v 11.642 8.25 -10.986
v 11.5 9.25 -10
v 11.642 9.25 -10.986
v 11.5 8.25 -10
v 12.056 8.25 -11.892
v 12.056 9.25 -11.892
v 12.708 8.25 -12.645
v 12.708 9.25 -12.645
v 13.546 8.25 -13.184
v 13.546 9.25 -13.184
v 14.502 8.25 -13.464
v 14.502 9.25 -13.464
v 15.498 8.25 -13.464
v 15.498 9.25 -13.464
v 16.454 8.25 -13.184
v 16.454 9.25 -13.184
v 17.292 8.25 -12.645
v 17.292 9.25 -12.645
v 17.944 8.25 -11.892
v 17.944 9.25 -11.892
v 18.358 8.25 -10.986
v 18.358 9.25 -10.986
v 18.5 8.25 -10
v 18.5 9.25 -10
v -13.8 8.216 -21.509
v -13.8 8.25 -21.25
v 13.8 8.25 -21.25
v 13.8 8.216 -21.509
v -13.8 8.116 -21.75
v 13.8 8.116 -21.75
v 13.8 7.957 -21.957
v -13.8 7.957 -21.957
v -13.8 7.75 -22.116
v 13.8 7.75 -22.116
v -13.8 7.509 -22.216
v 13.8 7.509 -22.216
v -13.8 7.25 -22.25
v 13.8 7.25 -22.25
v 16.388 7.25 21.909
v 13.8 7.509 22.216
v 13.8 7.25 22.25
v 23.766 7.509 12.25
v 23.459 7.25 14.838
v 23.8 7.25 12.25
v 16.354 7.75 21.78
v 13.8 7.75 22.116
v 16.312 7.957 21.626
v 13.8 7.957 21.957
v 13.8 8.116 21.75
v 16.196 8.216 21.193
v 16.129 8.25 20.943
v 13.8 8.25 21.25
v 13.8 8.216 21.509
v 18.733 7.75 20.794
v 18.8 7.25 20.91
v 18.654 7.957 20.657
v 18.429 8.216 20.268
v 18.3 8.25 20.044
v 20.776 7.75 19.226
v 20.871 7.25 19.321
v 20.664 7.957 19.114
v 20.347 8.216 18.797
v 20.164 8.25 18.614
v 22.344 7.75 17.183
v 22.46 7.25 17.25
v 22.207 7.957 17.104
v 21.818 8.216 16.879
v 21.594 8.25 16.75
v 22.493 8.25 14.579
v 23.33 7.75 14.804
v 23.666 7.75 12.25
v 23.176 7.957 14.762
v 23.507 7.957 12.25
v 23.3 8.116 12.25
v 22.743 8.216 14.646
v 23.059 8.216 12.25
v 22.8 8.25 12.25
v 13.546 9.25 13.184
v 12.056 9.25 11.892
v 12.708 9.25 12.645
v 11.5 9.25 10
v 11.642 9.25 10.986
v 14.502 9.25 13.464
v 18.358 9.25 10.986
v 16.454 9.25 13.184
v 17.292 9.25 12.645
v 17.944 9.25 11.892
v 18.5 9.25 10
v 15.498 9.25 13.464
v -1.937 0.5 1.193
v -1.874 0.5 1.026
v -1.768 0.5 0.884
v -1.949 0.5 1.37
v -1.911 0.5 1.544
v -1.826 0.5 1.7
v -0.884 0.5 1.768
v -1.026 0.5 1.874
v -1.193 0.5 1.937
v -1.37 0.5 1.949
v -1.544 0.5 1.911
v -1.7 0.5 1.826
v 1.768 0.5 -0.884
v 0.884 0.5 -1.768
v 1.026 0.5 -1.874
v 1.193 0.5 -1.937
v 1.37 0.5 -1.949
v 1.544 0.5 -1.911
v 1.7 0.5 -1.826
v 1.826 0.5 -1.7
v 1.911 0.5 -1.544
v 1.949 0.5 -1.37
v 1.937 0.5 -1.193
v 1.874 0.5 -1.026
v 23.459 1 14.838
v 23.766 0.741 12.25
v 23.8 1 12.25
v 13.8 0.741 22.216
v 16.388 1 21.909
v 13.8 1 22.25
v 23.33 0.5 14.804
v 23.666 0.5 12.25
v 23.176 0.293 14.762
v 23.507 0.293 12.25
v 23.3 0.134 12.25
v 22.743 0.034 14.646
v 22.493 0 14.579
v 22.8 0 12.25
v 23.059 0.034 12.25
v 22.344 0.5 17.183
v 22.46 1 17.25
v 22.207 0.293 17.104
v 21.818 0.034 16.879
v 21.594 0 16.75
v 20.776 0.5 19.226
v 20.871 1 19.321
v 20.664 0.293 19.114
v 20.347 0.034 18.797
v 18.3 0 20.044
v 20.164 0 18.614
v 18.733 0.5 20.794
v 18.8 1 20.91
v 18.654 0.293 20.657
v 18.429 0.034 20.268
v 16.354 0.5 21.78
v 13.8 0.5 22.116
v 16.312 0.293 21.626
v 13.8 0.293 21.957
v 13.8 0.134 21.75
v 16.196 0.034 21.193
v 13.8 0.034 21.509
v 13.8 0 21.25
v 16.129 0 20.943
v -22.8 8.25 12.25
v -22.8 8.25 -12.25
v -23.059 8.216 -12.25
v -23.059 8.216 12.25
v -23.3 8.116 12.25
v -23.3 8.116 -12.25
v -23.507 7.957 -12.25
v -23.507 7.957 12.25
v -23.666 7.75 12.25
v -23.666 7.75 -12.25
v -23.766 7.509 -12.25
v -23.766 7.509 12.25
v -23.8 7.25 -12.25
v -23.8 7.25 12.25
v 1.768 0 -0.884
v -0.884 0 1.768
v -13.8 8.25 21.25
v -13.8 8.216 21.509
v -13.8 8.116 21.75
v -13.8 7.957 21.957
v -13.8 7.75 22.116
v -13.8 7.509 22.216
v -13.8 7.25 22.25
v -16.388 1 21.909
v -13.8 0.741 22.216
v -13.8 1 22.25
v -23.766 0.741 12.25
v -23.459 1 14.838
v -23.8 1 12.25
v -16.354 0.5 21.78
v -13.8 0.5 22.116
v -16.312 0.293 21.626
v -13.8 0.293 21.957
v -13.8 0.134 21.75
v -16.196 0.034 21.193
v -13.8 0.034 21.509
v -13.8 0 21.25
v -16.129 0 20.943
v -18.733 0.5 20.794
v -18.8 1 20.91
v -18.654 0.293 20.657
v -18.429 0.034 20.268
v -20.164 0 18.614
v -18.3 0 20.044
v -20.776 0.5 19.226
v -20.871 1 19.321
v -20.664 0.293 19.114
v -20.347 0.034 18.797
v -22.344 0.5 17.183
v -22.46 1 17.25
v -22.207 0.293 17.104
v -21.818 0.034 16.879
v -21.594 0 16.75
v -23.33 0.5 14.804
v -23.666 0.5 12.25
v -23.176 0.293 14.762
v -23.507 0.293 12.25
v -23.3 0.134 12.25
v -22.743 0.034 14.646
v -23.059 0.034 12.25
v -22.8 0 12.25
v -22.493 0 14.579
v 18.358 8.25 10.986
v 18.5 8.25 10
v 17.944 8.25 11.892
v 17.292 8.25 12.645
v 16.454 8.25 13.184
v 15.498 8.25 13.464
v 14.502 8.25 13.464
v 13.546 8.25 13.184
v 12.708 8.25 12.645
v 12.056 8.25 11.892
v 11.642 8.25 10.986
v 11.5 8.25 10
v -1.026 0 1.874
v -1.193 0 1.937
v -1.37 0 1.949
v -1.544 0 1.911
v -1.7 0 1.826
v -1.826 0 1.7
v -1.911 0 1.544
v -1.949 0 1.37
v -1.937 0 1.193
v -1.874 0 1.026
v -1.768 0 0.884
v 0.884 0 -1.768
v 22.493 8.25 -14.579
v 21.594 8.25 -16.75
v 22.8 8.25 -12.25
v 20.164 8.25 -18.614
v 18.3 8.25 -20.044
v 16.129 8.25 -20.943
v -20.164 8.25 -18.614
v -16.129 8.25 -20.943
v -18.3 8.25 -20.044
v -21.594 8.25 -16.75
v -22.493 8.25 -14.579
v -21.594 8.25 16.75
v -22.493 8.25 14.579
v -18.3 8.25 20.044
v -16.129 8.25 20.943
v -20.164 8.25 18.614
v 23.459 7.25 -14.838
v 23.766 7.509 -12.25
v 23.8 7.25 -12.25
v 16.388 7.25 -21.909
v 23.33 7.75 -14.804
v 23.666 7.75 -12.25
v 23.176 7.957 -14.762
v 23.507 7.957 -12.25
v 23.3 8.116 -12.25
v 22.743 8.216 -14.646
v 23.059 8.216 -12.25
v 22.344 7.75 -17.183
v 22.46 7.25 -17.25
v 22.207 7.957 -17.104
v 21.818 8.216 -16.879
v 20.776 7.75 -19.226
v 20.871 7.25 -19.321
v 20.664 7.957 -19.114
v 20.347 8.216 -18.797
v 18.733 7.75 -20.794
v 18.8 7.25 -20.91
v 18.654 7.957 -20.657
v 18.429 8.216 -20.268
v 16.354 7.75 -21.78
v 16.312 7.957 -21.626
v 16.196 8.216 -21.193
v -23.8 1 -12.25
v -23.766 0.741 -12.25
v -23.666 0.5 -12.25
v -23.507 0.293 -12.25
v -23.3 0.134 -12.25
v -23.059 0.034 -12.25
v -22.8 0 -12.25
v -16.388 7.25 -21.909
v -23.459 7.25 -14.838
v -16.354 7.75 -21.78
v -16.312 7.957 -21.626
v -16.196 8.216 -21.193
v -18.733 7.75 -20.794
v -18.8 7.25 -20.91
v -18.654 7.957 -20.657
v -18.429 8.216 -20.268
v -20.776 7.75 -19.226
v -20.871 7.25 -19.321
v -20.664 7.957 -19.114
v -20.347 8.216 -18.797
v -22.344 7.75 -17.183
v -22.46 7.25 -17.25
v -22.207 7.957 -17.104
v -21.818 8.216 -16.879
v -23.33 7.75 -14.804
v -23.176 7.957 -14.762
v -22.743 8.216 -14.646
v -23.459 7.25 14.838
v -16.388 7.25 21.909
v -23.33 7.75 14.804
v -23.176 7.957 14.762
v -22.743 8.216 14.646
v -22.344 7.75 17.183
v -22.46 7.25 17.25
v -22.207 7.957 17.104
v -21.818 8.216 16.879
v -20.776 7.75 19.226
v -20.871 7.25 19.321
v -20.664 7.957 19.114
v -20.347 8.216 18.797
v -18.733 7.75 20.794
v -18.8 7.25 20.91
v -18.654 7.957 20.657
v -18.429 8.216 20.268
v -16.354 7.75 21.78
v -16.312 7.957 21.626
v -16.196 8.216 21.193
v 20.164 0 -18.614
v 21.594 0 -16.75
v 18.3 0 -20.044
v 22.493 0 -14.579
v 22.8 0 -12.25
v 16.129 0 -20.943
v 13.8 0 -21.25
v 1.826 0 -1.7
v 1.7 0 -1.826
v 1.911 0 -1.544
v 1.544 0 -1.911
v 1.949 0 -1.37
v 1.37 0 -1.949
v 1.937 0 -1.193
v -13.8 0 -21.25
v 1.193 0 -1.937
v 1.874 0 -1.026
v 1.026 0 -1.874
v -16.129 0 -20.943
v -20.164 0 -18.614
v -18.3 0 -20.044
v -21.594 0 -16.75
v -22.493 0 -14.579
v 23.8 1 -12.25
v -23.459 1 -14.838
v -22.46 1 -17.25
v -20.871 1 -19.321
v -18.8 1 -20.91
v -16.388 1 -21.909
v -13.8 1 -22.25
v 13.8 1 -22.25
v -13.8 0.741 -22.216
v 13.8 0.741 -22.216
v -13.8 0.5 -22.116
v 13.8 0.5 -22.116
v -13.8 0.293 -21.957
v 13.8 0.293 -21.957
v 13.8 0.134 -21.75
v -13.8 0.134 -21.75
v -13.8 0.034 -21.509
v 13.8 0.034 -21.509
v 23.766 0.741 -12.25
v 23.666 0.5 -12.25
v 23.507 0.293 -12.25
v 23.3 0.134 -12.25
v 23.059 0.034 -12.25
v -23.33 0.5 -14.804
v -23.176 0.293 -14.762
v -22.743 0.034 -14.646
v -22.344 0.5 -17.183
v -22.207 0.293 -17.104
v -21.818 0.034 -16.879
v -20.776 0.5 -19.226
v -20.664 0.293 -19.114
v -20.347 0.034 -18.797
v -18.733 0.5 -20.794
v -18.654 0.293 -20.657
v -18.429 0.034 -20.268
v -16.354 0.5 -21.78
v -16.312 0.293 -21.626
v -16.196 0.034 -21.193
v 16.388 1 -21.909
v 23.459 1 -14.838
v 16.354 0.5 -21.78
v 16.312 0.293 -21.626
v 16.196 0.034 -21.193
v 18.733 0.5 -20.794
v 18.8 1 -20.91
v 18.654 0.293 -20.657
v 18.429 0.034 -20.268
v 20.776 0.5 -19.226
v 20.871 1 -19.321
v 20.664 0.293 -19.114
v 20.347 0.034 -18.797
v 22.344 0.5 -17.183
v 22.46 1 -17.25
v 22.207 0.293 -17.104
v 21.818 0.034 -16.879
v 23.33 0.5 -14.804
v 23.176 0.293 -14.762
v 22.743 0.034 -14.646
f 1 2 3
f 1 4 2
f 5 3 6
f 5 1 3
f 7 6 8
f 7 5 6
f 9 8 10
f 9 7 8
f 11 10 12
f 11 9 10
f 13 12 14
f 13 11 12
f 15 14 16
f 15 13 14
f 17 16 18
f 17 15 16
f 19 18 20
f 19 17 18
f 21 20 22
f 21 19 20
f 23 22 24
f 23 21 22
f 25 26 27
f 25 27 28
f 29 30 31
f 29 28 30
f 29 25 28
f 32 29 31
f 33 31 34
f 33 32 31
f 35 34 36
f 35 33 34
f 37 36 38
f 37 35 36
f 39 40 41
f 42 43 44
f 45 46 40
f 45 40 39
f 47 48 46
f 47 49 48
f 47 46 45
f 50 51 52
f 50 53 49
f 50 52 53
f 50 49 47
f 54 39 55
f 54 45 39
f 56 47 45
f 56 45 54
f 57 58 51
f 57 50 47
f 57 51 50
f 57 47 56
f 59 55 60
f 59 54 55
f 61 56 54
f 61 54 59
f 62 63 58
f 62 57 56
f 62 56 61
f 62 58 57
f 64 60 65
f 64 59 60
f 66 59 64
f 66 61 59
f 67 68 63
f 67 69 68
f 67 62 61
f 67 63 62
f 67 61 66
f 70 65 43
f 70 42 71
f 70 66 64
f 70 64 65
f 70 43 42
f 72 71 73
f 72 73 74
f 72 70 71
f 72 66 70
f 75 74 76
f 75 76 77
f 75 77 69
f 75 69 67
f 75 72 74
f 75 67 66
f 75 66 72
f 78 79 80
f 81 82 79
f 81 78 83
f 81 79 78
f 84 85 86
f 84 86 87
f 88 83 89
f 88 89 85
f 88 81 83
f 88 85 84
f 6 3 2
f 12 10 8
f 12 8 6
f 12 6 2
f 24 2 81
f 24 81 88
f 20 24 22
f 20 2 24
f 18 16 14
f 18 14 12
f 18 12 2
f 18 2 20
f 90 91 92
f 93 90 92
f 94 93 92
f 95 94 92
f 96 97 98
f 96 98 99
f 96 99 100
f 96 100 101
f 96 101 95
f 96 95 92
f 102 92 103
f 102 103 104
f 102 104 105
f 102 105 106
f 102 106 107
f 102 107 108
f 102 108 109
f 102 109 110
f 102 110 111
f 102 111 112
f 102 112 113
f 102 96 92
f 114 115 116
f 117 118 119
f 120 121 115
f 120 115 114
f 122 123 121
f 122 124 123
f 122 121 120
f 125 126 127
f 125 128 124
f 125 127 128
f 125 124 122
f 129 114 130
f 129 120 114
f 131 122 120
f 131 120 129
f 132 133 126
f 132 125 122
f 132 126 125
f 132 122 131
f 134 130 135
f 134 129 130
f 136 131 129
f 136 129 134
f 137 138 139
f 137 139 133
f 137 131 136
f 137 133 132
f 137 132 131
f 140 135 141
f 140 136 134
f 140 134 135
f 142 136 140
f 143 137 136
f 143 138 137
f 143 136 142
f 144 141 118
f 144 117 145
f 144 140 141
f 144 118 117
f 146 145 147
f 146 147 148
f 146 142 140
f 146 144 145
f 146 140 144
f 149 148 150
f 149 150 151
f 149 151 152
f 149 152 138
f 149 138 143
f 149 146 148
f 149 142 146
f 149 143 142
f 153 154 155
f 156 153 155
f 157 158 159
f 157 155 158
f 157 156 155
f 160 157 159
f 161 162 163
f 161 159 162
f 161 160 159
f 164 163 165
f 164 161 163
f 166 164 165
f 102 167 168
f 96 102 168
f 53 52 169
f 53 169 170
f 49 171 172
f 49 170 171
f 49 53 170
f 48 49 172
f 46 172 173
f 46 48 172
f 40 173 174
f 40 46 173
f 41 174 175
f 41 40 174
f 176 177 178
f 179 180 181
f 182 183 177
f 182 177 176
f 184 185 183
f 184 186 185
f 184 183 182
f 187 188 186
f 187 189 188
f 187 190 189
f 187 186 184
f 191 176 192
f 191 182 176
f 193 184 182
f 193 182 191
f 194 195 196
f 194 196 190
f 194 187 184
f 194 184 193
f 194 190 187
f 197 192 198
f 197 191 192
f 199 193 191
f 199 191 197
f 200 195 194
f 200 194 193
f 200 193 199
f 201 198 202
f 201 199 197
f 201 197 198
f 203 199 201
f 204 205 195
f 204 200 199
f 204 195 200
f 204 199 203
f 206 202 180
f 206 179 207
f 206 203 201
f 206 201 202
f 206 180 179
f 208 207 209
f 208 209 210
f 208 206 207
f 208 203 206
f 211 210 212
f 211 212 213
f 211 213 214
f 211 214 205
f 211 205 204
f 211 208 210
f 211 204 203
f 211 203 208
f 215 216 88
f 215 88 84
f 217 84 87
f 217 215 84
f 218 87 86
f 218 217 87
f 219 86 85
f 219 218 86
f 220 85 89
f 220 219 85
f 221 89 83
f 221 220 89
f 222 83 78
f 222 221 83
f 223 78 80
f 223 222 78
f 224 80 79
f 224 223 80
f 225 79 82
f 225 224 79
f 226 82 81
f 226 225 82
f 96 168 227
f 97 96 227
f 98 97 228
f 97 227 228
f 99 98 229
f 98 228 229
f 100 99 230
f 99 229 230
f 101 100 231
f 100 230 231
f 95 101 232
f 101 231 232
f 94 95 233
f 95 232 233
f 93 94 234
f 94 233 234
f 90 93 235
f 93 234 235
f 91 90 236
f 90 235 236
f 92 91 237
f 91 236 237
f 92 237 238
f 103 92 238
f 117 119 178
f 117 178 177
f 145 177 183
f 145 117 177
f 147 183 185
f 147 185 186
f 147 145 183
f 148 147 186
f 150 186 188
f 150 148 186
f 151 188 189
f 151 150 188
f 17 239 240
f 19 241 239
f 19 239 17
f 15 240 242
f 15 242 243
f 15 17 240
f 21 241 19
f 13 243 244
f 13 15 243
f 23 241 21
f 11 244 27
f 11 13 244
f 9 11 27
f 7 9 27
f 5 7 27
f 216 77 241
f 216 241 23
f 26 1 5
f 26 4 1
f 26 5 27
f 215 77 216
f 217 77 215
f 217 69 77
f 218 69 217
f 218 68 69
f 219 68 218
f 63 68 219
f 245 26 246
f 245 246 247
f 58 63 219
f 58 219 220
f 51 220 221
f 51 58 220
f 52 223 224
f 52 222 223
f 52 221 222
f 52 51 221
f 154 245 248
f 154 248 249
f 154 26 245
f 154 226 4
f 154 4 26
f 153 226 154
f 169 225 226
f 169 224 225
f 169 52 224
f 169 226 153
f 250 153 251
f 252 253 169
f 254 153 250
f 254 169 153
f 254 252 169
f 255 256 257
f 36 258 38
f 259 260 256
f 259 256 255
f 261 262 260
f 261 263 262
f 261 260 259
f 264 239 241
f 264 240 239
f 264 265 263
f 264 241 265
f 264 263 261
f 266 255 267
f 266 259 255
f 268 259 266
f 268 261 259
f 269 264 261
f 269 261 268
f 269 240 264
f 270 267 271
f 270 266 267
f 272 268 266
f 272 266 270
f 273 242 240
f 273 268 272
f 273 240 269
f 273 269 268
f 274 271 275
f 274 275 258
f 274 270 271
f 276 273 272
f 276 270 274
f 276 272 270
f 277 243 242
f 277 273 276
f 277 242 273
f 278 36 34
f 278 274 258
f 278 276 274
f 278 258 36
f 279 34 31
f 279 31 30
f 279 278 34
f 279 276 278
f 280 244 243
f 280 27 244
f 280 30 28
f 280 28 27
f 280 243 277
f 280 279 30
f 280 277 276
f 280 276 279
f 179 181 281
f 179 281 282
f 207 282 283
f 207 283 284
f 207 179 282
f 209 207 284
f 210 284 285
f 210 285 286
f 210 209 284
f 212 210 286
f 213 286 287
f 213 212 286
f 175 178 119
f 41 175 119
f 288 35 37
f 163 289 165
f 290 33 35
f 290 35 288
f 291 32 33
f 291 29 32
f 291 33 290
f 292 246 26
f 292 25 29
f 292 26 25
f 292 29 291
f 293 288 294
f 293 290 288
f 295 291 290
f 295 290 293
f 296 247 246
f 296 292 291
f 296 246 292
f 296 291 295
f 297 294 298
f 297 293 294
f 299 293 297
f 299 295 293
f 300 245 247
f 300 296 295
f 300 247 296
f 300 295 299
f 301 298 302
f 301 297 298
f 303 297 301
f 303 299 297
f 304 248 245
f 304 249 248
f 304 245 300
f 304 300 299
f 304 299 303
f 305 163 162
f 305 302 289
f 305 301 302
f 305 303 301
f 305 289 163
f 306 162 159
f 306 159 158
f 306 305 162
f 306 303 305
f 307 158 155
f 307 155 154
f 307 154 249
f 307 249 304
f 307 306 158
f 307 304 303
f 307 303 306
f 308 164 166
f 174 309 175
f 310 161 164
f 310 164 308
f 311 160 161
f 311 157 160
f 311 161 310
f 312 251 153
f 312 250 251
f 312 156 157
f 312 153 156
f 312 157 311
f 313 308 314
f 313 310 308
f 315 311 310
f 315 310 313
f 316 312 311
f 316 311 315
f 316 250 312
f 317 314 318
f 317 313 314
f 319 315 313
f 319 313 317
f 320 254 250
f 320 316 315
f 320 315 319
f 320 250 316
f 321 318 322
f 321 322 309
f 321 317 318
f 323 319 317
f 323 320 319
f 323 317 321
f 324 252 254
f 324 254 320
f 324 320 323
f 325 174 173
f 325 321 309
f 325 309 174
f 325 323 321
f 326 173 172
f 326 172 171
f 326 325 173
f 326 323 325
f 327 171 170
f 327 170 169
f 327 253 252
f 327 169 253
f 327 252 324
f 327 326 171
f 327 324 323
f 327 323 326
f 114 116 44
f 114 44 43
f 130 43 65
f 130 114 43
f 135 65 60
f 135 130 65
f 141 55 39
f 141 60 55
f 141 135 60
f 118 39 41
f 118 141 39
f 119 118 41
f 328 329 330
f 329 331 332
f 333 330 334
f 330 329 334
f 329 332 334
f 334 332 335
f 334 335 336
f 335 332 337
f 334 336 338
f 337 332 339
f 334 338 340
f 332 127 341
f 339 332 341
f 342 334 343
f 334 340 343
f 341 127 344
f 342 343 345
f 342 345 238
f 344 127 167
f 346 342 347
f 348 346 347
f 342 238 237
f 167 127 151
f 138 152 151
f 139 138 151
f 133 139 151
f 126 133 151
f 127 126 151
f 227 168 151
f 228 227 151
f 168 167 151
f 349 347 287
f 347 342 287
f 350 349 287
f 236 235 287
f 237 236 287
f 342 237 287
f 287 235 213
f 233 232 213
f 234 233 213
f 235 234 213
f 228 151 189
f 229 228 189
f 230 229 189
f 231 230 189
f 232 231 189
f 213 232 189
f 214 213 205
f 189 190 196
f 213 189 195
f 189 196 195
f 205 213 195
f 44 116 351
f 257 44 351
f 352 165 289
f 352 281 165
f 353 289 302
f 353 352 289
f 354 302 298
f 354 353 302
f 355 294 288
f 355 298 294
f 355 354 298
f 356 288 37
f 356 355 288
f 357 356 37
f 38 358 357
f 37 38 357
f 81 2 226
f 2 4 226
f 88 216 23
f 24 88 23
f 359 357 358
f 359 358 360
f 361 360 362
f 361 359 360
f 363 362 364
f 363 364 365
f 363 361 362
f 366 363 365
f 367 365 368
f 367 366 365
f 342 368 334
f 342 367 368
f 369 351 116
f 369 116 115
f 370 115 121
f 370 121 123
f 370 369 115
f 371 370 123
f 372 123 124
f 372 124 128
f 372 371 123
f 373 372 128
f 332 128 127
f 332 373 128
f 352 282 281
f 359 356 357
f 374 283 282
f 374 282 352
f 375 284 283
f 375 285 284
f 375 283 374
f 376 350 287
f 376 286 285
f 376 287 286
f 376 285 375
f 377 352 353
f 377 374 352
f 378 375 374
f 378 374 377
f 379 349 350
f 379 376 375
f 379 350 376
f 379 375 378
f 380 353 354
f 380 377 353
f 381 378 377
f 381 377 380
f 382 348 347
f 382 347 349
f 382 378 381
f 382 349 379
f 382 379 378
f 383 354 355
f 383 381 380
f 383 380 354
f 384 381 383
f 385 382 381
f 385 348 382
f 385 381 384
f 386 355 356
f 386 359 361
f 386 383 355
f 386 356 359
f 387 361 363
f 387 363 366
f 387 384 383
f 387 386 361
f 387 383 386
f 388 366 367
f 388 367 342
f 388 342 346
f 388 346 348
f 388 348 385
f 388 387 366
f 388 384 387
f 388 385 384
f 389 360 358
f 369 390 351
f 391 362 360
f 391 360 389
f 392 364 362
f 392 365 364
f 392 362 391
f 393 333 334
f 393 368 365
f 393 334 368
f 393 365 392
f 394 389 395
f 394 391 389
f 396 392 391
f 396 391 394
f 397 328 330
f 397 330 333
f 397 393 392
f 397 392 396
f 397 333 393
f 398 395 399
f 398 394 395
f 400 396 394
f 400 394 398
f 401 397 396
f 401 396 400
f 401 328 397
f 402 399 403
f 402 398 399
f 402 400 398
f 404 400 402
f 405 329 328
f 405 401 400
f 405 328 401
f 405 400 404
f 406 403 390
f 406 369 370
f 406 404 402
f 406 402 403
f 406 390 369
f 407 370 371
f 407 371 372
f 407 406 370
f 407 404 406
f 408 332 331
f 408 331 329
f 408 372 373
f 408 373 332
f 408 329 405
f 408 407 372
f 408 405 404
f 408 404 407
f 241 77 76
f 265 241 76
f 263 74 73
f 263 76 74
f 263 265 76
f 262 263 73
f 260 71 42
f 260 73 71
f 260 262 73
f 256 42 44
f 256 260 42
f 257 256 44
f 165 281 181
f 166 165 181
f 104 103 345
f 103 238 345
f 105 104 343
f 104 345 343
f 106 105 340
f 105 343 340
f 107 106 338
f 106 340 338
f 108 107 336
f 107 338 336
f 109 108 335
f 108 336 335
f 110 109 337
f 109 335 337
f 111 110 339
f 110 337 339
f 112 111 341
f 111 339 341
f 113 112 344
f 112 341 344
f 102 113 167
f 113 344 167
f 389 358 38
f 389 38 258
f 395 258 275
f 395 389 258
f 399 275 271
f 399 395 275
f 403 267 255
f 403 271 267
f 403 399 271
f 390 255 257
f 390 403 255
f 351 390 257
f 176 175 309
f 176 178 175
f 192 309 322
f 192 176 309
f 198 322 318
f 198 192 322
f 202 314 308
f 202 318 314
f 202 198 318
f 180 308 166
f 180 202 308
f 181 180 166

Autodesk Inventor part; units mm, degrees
ref_plane "YZ Plane" through (0, 0, 0) normal (1, 0, 0) x (0, 1, 0)
ref_plane "XZ Plane" through (0, 0, 0) normal (0, 1, 0) x (-1, 0, 0)
ref_plane "XY Plane" through (0, 0, 0) normal (0, 0, 1) x (1, 0, 0)
sketch "Sketch1" plane through (0, 0, 0) normal (0, 1, 0) x (-1, 0, 0)
  line L0 (13.8, 22.25) -> (-13.8, 22.25)
  line L1 (-23.8, 12.25) -> (-23.8, -12.25)
  line L2 (-13.8, -22.25) -> (13.8, -22.25)
  line L3 (23.8, -12.25) -> (23.8, 12.25)
  line L4 (23.8, 22.25) -> (-23.8, -22.25) construction
  line L5 (-23.8, 22.25) -> (23.8, -22.25) construction
  arc A0 (23.8, 12.25) -> (13.8, 22.25) centre (13.8, 12.25) ccw
  arc A1 (13.8, -22.25) -> (23.8, -12.25) centre (13.8, -12.25) ccw
  arc A2 (-23.8, -12.25) -> (-13.8, -22.25) centre (-13.8, -12.25) ccw
  arc A3 (-13.8, 22.25) -> (-23.8, 12.25) centre (-13.8, 12.25) ccw
  point P0 (0, 0)
  dimension "d0" = 47.6
  dimension "d1" = 44.5
  dimension "d3" = 10
extrude "Extrusion1" add sketch "Sketch1" along normal blind 8.25
fillet "Fillet1" radius 1 16 edges at (20.8711, 0, 19.3211) (23.8, 0, 0) (20.8711, 0, -19.3211) (0, 0, -22.25) (-20.8711, 0, -19.3211) (-23.8, 0, 0) (-20.8711, 0, 19.3211) (0, 0, 22.25) (23.8, 8.25, 0) (20.8711, 8.25, -19.3211) (0, 8.25, -22.25) (-20.8711, 8.25, -19.3211) (-23.8, 8.25, 0) (-20.8711, 8.25, 19.3211) (0, 8.25, 22.25) (20.8711, 8.25, 19.3211)
sketch "Sketch2" plane through (0, 0, 0) normal (0, -1, 0) x (1, 0, 0)
  line L0 (-33.32, 0) -> (33.32, 0) projected
  line L1 (0, -31.15) -> (0, 31.15) projected
  point P0 (0, 0)
  point P1 (17, 12.5)
  point P2 (17, -12.5)
  point P3 (-17, 12.5)
  point P4 (-17, -12.5)
  dimension "d7" = 25
  dimension "d8" = 34
sketch "Sketch3" plane through (0, 0, 0) normal (0, -1, 0) x (1, 0, 0)
  line L0 (1.3258, -1.3258) -> (-1.3258, 1.3258) construction
  line L1 (1.7678, -0.8839) -> (-0.8839, 1.7678)
  line L2 (-1.7678, 0.8839) -> (0.8839, -1.7678)
  arc A0 (0.8839, -1.7678) -> (1.7678, -0.8839) centre (1.3258, -1.3258) ccw
  arc A1 (-0.8839, 1.7678) -> (-1.7678, 0.8839) centre (-1.3258, 1.3258) ccw
  line L3 (0, -31.15) -> (0, 31.15) projected
  point P0 (0, 0)
  point P1 (-1.7678, 1.7678)
  point P2 (1.7678, -1.7678)
  dimension "d9" = 5
  dimension "d10" = 1.25
  dimension "d11" = 135
extrude "Extrusion2" cut sketch "Sketch3" against normal blind 0.5
sketch "Sketch5" plane through (0, 8.25, 0) normal (0, 1, 0) x (1, 0, 0)
  line L0 (15, 10) -> (15, -10) construction
  line L1 (11.5, 10) -> (11.5, -10)
  line L2 (18.5, -10) -> (18.5, 10)
  arc A0 (18.5, 10) -> (11.5, 10) centre (15, 10) ccw
  arc A1 (11.5, -10) -> (18.5, -10) centre (15, -10) ccw
  point P0 (0, 0)
  point P1 (15, 0)
  dimension "d16" = 10
  dimension "d17" = 7
  dimension "d18" = 15
extrude "Extrusion4" add sketch "Sketch5" along normal blind 1
properties part number "Pin-Low-Fidelity"
